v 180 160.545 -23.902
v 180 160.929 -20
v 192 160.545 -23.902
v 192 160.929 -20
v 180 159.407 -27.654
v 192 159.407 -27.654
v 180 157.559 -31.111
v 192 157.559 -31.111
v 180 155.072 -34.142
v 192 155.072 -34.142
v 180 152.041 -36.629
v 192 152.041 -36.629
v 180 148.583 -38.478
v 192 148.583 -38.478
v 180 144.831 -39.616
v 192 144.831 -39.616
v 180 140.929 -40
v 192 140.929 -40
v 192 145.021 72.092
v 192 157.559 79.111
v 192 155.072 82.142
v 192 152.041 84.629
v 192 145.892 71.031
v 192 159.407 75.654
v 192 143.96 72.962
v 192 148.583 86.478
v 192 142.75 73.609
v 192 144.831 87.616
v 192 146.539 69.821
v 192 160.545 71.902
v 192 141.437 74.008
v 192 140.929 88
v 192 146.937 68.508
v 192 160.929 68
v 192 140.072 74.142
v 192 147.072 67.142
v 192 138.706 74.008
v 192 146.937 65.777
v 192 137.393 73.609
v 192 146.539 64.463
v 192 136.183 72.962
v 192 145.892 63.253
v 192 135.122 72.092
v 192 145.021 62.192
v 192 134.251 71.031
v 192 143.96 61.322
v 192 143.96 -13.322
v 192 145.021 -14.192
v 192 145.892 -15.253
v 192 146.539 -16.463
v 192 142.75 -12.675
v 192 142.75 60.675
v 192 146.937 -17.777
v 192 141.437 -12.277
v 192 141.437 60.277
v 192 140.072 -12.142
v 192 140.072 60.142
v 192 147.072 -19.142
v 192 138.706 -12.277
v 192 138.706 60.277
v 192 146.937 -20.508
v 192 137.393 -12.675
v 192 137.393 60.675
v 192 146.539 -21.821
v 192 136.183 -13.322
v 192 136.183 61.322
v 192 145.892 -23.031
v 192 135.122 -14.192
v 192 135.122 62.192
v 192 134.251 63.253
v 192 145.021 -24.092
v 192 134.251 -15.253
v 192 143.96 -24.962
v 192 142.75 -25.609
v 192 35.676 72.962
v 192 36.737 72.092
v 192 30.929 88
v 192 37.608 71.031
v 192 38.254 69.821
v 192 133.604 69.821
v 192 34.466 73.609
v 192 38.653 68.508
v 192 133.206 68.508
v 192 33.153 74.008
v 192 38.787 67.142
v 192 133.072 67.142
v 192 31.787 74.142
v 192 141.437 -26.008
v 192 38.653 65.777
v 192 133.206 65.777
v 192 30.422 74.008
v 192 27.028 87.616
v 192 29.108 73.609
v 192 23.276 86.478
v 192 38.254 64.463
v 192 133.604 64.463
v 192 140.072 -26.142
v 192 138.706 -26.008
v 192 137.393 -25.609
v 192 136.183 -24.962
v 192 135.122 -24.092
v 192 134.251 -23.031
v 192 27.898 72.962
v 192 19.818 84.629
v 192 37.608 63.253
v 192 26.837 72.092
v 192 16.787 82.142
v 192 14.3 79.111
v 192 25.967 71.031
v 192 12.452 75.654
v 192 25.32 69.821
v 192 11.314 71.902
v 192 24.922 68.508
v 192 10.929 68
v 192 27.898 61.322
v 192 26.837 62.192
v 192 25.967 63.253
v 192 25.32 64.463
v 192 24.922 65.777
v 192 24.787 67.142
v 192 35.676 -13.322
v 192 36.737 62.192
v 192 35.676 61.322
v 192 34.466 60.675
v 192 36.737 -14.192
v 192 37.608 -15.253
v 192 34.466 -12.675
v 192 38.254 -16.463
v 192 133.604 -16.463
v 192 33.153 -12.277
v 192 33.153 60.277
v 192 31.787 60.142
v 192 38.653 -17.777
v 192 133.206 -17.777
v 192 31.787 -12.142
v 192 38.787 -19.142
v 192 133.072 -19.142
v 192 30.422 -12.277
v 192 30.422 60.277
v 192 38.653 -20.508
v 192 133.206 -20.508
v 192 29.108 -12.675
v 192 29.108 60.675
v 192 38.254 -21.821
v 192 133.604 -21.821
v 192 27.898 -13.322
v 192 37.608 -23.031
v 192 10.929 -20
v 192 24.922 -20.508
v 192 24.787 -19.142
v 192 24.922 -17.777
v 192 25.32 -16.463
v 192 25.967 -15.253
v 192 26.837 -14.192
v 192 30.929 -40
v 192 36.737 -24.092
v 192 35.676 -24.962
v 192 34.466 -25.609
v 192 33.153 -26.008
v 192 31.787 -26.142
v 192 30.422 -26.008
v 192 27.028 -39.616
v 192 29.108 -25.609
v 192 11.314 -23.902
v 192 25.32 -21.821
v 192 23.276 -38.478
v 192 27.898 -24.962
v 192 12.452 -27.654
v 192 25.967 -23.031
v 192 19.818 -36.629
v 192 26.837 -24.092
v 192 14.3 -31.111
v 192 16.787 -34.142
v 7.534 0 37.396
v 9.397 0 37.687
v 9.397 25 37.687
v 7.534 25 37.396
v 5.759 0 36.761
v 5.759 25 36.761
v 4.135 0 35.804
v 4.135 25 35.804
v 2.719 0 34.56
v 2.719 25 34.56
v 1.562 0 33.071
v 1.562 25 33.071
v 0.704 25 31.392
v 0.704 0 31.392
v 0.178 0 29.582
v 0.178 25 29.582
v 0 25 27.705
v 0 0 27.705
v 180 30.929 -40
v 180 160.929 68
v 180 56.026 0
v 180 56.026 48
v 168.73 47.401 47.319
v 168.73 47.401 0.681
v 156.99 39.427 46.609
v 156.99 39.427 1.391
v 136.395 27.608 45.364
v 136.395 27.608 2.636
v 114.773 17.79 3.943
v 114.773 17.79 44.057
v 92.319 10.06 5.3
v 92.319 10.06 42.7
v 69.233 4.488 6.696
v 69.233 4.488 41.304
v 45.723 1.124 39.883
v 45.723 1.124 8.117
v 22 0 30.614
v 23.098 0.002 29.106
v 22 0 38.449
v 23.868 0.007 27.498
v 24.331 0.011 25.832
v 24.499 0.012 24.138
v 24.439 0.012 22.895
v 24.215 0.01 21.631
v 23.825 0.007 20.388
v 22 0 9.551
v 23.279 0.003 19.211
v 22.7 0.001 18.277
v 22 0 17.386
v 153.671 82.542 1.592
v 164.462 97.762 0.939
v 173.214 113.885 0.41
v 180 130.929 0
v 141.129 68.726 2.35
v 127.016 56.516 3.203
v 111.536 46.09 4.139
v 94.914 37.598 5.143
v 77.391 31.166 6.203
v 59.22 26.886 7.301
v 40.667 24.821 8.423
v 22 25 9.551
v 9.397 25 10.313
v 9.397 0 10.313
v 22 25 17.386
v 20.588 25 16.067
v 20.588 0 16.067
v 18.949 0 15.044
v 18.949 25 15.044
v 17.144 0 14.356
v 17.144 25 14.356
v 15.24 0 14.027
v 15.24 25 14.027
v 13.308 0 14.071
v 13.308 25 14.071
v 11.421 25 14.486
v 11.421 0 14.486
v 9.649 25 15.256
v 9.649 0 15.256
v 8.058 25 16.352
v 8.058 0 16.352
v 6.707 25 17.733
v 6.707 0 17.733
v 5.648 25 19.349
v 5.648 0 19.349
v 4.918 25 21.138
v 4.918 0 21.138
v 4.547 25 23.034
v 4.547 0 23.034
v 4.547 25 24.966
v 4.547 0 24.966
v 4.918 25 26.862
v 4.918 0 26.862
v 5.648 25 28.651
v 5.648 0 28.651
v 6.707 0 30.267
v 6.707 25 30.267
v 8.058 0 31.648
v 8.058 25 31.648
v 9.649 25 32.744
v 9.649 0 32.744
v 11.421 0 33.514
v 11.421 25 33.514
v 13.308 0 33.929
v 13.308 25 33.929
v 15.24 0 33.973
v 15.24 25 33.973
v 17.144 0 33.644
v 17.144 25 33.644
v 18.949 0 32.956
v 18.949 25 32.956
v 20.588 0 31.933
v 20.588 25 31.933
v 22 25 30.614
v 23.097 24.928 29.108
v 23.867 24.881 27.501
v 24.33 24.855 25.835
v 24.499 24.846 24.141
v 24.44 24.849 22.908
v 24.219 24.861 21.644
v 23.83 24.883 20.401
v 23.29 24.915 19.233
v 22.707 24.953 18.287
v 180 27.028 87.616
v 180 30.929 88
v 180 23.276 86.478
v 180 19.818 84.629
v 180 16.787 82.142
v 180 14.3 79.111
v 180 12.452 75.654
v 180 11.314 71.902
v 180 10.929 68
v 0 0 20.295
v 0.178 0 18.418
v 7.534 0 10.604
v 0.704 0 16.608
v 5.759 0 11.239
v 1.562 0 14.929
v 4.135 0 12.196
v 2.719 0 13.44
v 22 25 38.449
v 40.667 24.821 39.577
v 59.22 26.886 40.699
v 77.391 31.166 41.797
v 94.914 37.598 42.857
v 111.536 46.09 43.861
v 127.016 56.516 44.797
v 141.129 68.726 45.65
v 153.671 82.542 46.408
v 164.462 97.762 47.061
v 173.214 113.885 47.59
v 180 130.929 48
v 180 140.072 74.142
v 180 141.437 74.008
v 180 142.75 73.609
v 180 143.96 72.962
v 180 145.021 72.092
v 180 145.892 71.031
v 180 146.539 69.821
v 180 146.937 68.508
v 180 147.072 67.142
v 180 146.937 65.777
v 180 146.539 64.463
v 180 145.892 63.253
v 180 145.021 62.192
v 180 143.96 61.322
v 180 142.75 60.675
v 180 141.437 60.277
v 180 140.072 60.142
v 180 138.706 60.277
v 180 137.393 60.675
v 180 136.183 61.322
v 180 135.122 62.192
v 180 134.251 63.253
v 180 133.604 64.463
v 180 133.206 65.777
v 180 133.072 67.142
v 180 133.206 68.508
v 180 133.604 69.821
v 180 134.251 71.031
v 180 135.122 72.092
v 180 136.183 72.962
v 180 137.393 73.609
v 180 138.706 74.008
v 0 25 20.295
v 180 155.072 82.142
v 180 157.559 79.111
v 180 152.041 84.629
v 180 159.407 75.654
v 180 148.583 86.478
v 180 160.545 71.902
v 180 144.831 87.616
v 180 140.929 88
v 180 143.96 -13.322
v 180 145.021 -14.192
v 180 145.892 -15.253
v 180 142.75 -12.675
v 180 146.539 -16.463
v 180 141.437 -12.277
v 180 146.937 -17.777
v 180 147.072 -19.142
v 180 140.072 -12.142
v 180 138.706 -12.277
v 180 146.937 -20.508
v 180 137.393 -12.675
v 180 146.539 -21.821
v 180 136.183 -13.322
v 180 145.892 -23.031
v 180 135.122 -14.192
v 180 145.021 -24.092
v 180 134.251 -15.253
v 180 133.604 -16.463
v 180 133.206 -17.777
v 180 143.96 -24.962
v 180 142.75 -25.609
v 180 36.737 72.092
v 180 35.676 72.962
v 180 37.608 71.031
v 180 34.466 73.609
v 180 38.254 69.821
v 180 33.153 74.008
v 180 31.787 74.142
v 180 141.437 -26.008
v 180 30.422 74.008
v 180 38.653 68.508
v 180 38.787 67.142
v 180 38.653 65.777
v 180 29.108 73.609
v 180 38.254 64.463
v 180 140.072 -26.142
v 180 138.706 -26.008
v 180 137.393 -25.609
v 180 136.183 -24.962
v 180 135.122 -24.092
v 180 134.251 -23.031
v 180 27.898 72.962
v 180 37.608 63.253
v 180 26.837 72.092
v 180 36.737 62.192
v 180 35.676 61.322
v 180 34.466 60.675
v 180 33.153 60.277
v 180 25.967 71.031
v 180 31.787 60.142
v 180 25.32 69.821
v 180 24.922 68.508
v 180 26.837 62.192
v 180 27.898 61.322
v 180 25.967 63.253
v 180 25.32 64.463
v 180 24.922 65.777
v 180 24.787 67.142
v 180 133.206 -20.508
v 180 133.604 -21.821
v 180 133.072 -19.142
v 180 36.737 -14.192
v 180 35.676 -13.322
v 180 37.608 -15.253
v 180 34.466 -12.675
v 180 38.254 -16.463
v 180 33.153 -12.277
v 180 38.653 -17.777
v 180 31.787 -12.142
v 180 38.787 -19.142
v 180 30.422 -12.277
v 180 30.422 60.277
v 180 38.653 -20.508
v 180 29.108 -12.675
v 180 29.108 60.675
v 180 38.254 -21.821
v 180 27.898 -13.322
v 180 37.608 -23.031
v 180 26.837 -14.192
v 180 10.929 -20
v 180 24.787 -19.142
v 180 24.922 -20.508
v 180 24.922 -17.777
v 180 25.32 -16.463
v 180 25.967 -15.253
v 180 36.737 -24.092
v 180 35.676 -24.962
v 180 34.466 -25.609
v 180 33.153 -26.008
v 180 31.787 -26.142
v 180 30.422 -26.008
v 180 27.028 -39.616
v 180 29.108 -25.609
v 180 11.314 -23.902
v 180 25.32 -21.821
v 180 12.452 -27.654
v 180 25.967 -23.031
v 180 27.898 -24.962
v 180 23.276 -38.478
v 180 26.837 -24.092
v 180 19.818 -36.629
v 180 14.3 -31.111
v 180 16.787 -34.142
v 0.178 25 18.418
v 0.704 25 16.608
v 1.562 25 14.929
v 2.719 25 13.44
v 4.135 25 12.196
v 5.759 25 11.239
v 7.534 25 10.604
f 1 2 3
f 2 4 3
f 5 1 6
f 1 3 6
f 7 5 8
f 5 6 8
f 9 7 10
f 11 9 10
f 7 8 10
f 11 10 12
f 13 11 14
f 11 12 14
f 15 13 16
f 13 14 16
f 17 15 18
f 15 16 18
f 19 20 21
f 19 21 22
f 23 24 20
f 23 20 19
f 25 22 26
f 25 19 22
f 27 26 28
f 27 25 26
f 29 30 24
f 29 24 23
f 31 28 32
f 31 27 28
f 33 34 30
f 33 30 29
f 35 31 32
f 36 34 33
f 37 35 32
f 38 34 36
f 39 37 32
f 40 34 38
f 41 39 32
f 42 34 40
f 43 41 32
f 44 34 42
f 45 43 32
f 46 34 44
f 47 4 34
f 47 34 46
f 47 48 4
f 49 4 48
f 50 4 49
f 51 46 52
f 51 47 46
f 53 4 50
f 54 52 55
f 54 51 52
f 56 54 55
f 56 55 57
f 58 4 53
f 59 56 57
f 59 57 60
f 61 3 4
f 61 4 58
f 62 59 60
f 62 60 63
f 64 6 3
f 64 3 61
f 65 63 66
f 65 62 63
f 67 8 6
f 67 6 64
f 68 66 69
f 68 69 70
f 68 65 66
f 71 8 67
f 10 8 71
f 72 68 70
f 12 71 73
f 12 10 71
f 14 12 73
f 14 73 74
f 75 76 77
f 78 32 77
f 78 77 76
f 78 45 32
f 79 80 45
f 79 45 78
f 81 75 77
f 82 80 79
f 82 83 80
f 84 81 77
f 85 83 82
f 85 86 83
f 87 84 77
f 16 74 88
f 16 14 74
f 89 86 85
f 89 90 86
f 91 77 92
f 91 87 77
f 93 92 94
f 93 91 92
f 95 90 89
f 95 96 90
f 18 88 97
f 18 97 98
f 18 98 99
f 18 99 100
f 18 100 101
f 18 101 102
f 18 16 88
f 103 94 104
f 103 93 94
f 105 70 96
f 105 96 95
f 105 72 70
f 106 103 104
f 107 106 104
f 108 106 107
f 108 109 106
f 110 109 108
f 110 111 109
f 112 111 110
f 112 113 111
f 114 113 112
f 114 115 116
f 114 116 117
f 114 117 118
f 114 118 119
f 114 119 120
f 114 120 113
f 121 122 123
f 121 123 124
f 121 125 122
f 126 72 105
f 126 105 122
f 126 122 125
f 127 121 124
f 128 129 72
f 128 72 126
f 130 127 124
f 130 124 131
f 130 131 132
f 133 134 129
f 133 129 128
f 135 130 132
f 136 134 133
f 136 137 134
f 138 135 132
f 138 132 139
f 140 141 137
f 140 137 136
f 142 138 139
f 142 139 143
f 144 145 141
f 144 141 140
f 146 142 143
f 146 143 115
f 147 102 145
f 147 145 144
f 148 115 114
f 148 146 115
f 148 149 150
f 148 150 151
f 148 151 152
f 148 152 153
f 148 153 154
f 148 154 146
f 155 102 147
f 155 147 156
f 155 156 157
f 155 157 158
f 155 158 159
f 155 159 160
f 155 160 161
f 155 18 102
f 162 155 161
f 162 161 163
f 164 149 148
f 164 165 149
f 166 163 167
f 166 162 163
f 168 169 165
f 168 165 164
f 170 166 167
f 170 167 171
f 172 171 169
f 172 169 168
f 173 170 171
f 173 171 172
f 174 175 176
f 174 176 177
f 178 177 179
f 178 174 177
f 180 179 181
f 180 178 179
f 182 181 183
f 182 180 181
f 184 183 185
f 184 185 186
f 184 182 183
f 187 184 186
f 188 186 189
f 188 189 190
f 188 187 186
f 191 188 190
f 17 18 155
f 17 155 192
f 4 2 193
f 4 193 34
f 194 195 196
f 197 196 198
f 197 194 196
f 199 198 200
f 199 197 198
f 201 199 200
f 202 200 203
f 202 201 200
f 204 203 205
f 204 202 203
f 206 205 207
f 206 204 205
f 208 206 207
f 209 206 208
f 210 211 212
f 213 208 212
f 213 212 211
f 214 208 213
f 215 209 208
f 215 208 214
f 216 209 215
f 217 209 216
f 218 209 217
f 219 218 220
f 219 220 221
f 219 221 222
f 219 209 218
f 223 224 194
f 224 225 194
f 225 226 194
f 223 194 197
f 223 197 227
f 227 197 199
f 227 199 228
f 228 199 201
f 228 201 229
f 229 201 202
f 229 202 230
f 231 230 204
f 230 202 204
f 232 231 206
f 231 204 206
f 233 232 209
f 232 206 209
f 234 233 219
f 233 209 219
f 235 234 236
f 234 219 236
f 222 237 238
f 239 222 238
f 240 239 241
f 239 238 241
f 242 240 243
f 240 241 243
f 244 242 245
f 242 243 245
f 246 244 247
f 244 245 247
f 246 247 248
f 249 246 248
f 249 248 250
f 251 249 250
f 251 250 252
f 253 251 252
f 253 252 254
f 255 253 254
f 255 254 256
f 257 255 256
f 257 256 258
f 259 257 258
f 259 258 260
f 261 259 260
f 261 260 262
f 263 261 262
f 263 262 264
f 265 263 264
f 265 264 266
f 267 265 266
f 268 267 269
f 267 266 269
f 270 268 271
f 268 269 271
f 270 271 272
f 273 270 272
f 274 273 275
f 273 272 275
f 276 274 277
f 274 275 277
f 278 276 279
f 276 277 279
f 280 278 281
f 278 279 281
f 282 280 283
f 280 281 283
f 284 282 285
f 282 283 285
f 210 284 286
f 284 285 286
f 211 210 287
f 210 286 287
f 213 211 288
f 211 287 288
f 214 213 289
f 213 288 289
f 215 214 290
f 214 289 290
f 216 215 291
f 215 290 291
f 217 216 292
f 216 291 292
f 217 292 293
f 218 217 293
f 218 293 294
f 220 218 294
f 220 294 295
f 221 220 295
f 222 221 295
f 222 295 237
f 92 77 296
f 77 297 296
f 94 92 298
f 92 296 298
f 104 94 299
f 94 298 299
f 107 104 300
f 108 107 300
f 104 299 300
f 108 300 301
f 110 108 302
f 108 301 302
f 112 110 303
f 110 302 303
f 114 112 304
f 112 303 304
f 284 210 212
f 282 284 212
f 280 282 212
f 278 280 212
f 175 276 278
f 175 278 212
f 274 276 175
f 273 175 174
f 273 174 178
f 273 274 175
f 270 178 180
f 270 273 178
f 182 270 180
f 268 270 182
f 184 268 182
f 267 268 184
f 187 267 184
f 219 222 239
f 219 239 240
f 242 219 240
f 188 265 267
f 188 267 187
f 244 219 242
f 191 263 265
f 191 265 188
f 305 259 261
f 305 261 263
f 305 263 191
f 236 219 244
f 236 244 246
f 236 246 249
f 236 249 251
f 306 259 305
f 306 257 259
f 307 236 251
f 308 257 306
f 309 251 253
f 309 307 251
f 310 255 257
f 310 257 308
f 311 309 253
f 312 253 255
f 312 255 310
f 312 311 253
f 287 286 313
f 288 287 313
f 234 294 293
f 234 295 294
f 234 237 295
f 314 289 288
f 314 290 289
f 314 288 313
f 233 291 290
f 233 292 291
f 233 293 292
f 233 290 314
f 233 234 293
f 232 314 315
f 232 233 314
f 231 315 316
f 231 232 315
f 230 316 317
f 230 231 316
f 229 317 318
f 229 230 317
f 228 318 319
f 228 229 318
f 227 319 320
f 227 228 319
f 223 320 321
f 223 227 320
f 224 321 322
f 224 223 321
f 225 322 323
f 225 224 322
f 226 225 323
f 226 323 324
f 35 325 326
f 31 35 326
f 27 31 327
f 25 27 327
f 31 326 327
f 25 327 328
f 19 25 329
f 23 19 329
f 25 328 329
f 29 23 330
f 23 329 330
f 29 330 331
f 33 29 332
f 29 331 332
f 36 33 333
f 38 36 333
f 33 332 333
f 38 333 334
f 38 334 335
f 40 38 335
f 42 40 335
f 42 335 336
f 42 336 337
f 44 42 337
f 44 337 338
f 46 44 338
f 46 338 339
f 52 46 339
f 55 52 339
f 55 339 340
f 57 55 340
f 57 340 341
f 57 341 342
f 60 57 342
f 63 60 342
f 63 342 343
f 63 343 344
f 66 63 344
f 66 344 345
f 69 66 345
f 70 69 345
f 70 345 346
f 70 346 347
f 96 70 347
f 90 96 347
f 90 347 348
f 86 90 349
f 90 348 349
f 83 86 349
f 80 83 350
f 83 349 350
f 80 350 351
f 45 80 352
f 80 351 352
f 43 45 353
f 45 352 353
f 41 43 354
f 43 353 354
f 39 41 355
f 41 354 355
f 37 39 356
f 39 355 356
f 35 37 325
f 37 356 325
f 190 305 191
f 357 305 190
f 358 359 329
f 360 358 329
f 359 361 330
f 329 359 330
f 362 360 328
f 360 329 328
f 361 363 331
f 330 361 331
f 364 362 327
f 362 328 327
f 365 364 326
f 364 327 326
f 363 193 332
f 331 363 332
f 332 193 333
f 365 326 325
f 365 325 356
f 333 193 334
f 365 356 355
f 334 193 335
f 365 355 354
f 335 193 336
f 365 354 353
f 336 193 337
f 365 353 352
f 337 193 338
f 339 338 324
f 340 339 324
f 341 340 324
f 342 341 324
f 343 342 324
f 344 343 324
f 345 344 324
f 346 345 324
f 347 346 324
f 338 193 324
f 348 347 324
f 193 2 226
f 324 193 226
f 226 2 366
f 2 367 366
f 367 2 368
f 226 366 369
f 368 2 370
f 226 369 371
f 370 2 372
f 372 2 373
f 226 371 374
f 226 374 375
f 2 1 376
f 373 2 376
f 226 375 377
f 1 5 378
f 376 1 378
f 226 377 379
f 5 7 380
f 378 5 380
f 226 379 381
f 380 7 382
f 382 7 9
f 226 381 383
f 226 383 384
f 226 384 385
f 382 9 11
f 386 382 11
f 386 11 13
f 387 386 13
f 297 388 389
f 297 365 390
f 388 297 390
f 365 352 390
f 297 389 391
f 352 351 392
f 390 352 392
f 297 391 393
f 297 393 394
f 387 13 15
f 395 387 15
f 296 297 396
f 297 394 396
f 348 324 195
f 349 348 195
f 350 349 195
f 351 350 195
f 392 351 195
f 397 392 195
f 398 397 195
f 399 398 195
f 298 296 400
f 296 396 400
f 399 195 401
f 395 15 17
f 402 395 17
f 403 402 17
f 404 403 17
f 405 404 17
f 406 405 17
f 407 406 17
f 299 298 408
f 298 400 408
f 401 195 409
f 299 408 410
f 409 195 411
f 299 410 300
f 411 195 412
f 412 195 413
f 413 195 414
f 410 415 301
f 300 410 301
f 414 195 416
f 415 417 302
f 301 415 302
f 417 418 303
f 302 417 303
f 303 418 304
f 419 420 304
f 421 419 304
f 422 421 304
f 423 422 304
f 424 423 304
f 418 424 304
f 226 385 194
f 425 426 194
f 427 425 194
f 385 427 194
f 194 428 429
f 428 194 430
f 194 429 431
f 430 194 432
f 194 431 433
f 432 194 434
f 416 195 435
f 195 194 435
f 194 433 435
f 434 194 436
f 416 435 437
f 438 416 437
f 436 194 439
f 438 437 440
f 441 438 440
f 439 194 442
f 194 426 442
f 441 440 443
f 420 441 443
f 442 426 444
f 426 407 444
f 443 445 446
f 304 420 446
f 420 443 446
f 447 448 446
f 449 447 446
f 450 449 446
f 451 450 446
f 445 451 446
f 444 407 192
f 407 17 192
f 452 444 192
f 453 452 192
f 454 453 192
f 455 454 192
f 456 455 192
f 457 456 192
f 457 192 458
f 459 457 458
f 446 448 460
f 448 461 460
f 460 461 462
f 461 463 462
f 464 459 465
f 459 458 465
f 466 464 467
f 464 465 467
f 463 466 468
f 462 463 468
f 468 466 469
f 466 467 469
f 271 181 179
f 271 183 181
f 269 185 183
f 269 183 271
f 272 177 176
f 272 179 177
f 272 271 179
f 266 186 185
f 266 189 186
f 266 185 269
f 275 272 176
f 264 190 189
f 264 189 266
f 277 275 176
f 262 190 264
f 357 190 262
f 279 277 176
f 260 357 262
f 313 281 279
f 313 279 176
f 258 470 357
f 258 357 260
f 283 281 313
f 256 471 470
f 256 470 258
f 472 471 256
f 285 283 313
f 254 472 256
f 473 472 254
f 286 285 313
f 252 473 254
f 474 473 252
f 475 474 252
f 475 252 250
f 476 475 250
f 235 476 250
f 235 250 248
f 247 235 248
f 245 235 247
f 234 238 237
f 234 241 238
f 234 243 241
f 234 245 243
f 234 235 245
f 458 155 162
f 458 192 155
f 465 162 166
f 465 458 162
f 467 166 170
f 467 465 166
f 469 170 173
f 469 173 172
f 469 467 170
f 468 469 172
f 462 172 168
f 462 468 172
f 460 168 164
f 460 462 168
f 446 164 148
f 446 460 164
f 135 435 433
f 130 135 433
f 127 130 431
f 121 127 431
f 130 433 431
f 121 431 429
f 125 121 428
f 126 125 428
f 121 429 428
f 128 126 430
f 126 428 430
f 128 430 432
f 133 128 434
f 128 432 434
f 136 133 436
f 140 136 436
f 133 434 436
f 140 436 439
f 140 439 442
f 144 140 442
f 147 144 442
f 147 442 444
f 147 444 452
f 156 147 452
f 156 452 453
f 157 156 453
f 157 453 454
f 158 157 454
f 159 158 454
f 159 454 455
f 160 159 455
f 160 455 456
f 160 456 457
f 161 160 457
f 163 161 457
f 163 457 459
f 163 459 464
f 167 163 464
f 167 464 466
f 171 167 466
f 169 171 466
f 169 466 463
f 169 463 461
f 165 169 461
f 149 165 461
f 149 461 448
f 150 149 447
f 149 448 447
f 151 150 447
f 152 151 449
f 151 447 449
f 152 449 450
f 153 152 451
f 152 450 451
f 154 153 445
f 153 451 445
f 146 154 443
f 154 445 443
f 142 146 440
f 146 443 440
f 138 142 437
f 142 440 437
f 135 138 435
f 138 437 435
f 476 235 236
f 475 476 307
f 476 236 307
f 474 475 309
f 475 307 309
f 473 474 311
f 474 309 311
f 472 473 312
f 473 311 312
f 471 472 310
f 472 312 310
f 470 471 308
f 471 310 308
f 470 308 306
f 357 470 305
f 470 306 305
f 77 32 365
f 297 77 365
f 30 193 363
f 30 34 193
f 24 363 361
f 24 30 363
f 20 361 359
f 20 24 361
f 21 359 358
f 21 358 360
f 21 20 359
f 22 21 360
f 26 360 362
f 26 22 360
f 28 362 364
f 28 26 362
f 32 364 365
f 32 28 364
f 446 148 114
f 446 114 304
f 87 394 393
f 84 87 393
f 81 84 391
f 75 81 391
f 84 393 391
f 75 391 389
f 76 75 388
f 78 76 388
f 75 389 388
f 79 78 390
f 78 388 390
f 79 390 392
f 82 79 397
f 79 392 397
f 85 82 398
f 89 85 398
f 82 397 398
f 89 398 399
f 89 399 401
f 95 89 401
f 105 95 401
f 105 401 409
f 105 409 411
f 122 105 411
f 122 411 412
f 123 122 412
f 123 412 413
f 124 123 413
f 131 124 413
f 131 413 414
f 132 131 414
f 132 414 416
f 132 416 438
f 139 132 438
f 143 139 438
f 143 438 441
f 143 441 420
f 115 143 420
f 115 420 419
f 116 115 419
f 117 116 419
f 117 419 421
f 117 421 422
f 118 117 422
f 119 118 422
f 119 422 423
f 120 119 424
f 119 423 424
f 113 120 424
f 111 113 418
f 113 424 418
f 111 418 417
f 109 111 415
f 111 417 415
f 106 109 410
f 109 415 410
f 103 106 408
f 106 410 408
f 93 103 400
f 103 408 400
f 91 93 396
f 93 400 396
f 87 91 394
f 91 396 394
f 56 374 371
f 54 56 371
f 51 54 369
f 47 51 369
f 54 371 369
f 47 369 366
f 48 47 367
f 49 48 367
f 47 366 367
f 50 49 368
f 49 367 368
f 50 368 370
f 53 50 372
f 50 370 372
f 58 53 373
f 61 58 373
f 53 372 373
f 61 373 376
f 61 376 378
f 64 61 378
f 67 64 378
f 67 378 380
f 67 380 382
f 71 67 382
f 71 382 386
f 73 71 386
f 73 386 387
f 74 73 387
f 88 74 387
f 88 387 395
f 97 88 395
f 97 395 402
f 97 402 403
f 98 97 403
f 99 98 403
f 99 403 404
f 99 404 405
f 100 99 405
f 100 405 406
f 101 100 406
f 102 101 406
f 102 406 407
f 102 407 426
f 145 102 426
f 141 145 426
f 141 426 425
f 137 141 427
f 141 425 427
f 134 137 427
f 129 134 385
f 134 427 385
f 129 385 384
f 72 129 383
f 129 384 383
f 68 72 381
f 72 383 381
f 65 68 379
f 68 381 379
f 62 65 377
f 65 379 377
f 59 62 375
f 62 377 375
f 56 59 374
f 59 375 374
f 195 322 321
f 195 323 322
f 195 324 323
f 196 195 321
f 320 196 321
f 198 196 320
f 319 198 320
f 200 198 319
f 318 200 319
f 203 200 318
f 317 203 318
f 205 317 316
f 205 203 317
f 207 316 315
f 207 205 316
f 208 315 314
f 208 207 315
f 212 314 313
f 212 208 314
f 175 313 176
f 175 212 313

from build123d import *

# Parameters (mm, degrees)
BOSS_EXTRUDE1_DEPTH      = 48
BOSS_EXTRUDE4_DEPTH      = 40
BOSS_EXTRUDE4_DEPTH_BACK = 88
FILLET2_R                = 20
SKETCH10_R               = 7
CUT_EXTRUDE3_DEPTH       = 40
CUT_EXTRUDE4_DEPTH       = 180
SKETCH12_R               = 10
CUT_EXTRUDE5_DEPTH       = 180


with BuildPart() as part:
    # Sketch1 → Boss-Extrude1 (new body)
    with BuildSketch(Plane.XY):
        with BuildLine():
            Line((0, 0), (0, 25.00039893))
            Line((0, 25.00039893), (22, 25.00039893))
            ThreePointArc((22, 25.00039893), (119.156102476, 50.883868102), (180, 130.929369905))
            Line((180, 130.929369905), (180, 56.026453851))
            ThreePointArc((180, 56.026453851), (105.819692691, 14.421228989), (22, 0))
            Line((22, 0), (0, 0))
        make_face()
    extrude(amount=BOSS_EXTRUDE1_DEPTH)

    # Sketch9 → Boss-Extrude4 (add, two sides: drawn at the far end of the back side and taken through both)
    with BuildSketch(Plane.XY.offset(48).offset(-BOSS_EXTRUDE4_DEPTH_BACK)):
        Polygon((180, 130.929369905), (180, 160.929369905), (192, 160.929369905), (192, 10.929369905), (180, 10.929369905), (180, 51.308831421), align=None)
    extrude(amount=BOSS_EXTRUDE4_DEPTH + BOSS_EXTRUDE4_DEPTH_BACK)

    # Fillet2
    fillet2_edges = [part.edges().sort_by_distance(p)[0] for p in [
        (186, 160.929369905, -40),
        (186, 10.929369905, -40),
        (186, 10.929369905, 88),
        (186, 160.929369905, 88),
    ]]
    fillet(fillet2_edges, radius=FILLET2_R)

    # Sketch10 → Cut-Extrude3 (cut)
    with BuildSketch(Plane.ZY.offset(-180)):
        with Locations((-19.142135624, 140.071505529)):
            Circle(SKETCH10_R)
        with Locations((67.142135624, 140.071505529)):
            Circle(SKETCH10_R)
        with Locations((67.142135624, 31.787234281)):
            Circle(SKETCH10_R)
        with Locations((-19.142135624, 31.787234281)):
            Circle(SKETCH10_R)
    extrude(amount=-CUT_EXTRUDE3_DEPTH, mode=Mode.SUBTRACT)

    # Sketch11 → Cut-Extrude4 (cut)
    with BuildSketch(Plane(origin=(0, 0, 0), x_dir=(1, 0, 0), z_dir=(0, 1, 0))):
        with BuildLine():
            ThreePointArc((9.39659903, -10.313017355), (2.718722307, -13.440381836), (0, -20.294796118))
            Line((0, -20.294796118), (0, 0))
            Line((0, 0), (180, 0))
            Line((180, 0), (9.39659903, -10.313017355))
        make_face()
        with BuildLine():
            ThreePointArc((9.39659903, -37.686982645), (2.718722307, -34.559618164), (0, -27.705203882))
            Line((0, -27.705203882), (0, -48))
            Line((0, -48), (180, -48))
            Line((180, -48), (9.39659903, -37.686982645))
        make_face()
    extrude(amount=CUT_EXTRUDE4_DEPTH, mode=Mode.SUBTRACT)

    # Sketch12 → Cut-Extrude5 (cut)
    with BuildSketch(Plane(origin=(0, 25.00039893, 0), x_dir=(1, 0, 0), z_dir=(0, 1, 0))):
        with Locations(Location((14.5, -24, 0), (0, 0, 41.409622109))):
            Circle(SKETCH12_R)
    extrude(amount=-CUT_EXTRUDE5_DEPTH, mode=Mode.SUBTRACT)


solid = part.part
